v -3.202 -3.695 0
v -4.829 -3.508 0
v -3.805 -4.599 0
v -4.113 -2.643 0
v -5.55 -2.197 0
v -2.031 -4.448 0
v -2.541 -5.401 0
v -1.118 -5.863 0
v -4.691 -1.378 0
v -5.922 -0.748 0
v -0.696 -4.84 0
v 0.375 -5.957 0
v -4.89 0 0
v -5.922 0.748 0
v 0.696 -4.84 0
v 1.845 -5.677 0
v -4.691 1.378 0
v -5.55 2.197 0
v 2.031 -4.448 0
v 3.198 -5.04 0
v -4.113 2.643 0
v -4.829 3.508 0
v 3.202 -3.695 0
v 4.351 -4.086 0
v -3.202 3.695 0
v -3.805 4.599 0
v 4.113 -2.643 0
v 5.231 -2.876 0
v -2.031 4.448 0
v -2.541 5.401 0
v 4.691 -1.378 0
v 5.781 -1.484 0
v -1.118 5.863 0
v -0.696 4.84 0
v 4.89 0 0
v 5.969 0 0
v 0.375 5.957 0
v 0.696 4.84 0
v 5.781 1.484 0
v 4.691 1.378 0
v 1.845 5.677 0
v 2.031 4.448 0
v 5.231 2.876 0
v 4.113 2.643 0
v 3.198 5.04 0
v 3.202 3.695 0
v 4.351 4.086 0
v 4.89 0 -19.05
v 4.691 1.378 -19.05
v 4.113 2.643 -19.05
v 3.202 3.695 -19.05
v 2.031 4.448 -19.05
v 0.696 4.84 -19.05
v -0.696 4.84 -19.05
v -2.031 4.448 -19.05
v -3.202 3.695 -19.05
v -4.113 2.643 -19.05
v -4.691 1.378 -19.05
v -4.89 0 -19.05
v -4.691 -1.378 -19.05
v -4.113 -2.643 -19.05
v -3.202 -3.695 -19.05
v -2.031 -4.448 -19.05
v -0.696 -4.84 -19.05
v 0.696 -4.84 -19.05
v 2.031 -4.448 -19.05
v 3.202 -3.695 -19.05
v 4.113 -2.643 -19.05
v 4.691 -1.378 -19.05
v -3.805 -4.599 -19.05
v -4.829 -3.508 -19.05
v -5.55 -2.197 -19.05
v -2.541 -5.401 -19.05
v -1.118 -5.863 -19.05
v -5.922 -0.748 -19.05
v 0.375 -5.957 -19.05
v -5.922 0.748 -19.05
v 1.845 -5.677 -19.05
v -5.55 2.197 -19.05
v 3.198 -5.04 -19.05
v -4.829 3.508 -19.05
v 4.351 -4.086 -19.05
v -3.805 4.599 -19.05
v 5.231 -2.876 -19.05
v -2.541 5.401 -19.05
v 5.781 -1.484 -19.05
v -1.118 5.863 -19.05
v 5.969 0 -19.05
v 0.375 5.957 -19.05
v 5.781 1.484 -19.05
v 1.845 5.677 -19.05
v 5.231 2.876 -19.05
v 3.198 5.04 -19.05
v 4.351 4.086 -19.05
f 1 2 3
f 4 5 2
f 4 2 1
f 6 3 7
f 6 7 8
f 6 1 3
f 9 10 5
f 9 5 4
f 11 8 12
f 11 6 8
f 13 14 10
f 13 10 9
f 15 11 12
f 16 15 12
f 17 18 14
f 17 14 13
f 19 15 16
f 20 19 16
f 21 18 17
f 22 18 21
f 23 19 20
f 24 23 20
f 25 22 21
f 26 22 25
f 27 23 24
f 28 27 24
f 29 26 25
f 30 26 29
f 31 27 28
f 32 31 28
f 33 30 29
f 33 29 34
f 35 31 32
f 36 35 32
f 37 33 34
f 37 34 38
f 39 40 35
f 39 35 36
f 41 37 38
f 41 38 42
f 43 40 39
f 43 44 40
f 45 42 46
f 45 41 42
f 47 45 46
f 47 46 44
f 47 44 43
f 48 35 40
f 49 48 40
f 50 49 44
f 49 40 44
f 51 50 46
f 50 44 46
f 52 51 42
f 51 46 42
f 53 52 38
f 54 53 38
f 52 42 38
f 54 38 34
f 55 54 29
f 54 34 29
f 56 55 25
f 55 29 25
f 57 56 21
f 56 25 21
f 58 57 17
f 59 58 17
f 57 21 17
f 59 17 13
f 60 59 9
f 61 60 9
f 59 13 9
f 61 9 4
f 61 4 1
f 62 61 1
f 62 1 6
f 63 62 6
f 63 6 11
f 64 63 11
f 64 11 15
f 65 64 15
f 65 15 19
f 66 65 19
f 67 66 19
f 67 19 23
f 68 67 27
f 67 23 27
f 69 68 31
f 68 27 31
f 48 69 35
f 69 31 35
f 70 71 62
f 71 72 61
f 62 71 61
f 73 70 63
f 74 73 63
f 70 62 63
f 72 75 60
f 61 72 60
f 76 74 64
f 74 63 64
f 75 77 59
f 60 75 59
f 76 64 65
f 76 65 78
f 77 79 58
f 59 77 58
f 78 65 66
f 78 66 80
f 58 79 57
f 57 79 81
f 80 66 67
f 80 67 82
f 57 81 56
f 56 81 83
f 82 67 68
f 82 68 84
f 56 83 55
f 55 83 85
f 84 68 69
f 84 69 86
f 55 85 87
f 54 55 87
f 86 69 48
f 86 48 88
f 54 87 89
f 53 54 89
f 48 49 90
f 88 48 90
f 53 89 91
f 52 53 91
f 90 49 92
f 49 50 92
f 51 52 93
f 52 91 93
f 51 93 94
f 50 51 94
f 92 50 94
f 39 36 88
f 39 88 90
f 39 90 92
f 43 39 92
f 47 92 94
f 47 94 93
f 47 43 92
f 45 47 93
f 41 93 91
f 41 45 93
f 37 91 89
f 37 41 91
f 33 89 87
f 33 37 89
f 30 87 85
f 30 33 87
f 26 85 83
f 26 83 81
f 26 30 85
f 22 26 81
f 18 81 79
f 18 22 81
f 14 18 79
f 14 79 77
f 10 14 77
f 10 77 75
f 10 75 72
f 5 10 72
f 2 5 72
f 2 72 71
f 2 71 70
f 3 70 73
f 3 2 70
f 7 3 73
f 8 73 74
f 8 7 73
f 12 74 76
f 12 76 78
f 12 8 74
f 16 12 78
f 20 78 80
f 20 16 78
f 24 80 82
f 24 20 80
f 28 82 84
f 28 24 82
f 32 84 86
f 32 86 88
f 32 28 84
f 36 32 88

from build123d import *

# Parameters (mm, degrees)
F0_R     = 5.969
F0_R_2   = 4.8895
F1_DEPTH = 19.05


with BuildPart() as f1:
    # F0 (on Top) → F1 (new body)
    with BuildSketch(Plane.XY):
        Circle(F0_R)
        Circle(F0_R_2, mode=Mode.SUBTRACT)
    extrude(amount=-F1_DEPTH)


with BuildPart() as f2_1:
    # F2: copy of F1
    add(f1.part)


solid = f2_1.part
